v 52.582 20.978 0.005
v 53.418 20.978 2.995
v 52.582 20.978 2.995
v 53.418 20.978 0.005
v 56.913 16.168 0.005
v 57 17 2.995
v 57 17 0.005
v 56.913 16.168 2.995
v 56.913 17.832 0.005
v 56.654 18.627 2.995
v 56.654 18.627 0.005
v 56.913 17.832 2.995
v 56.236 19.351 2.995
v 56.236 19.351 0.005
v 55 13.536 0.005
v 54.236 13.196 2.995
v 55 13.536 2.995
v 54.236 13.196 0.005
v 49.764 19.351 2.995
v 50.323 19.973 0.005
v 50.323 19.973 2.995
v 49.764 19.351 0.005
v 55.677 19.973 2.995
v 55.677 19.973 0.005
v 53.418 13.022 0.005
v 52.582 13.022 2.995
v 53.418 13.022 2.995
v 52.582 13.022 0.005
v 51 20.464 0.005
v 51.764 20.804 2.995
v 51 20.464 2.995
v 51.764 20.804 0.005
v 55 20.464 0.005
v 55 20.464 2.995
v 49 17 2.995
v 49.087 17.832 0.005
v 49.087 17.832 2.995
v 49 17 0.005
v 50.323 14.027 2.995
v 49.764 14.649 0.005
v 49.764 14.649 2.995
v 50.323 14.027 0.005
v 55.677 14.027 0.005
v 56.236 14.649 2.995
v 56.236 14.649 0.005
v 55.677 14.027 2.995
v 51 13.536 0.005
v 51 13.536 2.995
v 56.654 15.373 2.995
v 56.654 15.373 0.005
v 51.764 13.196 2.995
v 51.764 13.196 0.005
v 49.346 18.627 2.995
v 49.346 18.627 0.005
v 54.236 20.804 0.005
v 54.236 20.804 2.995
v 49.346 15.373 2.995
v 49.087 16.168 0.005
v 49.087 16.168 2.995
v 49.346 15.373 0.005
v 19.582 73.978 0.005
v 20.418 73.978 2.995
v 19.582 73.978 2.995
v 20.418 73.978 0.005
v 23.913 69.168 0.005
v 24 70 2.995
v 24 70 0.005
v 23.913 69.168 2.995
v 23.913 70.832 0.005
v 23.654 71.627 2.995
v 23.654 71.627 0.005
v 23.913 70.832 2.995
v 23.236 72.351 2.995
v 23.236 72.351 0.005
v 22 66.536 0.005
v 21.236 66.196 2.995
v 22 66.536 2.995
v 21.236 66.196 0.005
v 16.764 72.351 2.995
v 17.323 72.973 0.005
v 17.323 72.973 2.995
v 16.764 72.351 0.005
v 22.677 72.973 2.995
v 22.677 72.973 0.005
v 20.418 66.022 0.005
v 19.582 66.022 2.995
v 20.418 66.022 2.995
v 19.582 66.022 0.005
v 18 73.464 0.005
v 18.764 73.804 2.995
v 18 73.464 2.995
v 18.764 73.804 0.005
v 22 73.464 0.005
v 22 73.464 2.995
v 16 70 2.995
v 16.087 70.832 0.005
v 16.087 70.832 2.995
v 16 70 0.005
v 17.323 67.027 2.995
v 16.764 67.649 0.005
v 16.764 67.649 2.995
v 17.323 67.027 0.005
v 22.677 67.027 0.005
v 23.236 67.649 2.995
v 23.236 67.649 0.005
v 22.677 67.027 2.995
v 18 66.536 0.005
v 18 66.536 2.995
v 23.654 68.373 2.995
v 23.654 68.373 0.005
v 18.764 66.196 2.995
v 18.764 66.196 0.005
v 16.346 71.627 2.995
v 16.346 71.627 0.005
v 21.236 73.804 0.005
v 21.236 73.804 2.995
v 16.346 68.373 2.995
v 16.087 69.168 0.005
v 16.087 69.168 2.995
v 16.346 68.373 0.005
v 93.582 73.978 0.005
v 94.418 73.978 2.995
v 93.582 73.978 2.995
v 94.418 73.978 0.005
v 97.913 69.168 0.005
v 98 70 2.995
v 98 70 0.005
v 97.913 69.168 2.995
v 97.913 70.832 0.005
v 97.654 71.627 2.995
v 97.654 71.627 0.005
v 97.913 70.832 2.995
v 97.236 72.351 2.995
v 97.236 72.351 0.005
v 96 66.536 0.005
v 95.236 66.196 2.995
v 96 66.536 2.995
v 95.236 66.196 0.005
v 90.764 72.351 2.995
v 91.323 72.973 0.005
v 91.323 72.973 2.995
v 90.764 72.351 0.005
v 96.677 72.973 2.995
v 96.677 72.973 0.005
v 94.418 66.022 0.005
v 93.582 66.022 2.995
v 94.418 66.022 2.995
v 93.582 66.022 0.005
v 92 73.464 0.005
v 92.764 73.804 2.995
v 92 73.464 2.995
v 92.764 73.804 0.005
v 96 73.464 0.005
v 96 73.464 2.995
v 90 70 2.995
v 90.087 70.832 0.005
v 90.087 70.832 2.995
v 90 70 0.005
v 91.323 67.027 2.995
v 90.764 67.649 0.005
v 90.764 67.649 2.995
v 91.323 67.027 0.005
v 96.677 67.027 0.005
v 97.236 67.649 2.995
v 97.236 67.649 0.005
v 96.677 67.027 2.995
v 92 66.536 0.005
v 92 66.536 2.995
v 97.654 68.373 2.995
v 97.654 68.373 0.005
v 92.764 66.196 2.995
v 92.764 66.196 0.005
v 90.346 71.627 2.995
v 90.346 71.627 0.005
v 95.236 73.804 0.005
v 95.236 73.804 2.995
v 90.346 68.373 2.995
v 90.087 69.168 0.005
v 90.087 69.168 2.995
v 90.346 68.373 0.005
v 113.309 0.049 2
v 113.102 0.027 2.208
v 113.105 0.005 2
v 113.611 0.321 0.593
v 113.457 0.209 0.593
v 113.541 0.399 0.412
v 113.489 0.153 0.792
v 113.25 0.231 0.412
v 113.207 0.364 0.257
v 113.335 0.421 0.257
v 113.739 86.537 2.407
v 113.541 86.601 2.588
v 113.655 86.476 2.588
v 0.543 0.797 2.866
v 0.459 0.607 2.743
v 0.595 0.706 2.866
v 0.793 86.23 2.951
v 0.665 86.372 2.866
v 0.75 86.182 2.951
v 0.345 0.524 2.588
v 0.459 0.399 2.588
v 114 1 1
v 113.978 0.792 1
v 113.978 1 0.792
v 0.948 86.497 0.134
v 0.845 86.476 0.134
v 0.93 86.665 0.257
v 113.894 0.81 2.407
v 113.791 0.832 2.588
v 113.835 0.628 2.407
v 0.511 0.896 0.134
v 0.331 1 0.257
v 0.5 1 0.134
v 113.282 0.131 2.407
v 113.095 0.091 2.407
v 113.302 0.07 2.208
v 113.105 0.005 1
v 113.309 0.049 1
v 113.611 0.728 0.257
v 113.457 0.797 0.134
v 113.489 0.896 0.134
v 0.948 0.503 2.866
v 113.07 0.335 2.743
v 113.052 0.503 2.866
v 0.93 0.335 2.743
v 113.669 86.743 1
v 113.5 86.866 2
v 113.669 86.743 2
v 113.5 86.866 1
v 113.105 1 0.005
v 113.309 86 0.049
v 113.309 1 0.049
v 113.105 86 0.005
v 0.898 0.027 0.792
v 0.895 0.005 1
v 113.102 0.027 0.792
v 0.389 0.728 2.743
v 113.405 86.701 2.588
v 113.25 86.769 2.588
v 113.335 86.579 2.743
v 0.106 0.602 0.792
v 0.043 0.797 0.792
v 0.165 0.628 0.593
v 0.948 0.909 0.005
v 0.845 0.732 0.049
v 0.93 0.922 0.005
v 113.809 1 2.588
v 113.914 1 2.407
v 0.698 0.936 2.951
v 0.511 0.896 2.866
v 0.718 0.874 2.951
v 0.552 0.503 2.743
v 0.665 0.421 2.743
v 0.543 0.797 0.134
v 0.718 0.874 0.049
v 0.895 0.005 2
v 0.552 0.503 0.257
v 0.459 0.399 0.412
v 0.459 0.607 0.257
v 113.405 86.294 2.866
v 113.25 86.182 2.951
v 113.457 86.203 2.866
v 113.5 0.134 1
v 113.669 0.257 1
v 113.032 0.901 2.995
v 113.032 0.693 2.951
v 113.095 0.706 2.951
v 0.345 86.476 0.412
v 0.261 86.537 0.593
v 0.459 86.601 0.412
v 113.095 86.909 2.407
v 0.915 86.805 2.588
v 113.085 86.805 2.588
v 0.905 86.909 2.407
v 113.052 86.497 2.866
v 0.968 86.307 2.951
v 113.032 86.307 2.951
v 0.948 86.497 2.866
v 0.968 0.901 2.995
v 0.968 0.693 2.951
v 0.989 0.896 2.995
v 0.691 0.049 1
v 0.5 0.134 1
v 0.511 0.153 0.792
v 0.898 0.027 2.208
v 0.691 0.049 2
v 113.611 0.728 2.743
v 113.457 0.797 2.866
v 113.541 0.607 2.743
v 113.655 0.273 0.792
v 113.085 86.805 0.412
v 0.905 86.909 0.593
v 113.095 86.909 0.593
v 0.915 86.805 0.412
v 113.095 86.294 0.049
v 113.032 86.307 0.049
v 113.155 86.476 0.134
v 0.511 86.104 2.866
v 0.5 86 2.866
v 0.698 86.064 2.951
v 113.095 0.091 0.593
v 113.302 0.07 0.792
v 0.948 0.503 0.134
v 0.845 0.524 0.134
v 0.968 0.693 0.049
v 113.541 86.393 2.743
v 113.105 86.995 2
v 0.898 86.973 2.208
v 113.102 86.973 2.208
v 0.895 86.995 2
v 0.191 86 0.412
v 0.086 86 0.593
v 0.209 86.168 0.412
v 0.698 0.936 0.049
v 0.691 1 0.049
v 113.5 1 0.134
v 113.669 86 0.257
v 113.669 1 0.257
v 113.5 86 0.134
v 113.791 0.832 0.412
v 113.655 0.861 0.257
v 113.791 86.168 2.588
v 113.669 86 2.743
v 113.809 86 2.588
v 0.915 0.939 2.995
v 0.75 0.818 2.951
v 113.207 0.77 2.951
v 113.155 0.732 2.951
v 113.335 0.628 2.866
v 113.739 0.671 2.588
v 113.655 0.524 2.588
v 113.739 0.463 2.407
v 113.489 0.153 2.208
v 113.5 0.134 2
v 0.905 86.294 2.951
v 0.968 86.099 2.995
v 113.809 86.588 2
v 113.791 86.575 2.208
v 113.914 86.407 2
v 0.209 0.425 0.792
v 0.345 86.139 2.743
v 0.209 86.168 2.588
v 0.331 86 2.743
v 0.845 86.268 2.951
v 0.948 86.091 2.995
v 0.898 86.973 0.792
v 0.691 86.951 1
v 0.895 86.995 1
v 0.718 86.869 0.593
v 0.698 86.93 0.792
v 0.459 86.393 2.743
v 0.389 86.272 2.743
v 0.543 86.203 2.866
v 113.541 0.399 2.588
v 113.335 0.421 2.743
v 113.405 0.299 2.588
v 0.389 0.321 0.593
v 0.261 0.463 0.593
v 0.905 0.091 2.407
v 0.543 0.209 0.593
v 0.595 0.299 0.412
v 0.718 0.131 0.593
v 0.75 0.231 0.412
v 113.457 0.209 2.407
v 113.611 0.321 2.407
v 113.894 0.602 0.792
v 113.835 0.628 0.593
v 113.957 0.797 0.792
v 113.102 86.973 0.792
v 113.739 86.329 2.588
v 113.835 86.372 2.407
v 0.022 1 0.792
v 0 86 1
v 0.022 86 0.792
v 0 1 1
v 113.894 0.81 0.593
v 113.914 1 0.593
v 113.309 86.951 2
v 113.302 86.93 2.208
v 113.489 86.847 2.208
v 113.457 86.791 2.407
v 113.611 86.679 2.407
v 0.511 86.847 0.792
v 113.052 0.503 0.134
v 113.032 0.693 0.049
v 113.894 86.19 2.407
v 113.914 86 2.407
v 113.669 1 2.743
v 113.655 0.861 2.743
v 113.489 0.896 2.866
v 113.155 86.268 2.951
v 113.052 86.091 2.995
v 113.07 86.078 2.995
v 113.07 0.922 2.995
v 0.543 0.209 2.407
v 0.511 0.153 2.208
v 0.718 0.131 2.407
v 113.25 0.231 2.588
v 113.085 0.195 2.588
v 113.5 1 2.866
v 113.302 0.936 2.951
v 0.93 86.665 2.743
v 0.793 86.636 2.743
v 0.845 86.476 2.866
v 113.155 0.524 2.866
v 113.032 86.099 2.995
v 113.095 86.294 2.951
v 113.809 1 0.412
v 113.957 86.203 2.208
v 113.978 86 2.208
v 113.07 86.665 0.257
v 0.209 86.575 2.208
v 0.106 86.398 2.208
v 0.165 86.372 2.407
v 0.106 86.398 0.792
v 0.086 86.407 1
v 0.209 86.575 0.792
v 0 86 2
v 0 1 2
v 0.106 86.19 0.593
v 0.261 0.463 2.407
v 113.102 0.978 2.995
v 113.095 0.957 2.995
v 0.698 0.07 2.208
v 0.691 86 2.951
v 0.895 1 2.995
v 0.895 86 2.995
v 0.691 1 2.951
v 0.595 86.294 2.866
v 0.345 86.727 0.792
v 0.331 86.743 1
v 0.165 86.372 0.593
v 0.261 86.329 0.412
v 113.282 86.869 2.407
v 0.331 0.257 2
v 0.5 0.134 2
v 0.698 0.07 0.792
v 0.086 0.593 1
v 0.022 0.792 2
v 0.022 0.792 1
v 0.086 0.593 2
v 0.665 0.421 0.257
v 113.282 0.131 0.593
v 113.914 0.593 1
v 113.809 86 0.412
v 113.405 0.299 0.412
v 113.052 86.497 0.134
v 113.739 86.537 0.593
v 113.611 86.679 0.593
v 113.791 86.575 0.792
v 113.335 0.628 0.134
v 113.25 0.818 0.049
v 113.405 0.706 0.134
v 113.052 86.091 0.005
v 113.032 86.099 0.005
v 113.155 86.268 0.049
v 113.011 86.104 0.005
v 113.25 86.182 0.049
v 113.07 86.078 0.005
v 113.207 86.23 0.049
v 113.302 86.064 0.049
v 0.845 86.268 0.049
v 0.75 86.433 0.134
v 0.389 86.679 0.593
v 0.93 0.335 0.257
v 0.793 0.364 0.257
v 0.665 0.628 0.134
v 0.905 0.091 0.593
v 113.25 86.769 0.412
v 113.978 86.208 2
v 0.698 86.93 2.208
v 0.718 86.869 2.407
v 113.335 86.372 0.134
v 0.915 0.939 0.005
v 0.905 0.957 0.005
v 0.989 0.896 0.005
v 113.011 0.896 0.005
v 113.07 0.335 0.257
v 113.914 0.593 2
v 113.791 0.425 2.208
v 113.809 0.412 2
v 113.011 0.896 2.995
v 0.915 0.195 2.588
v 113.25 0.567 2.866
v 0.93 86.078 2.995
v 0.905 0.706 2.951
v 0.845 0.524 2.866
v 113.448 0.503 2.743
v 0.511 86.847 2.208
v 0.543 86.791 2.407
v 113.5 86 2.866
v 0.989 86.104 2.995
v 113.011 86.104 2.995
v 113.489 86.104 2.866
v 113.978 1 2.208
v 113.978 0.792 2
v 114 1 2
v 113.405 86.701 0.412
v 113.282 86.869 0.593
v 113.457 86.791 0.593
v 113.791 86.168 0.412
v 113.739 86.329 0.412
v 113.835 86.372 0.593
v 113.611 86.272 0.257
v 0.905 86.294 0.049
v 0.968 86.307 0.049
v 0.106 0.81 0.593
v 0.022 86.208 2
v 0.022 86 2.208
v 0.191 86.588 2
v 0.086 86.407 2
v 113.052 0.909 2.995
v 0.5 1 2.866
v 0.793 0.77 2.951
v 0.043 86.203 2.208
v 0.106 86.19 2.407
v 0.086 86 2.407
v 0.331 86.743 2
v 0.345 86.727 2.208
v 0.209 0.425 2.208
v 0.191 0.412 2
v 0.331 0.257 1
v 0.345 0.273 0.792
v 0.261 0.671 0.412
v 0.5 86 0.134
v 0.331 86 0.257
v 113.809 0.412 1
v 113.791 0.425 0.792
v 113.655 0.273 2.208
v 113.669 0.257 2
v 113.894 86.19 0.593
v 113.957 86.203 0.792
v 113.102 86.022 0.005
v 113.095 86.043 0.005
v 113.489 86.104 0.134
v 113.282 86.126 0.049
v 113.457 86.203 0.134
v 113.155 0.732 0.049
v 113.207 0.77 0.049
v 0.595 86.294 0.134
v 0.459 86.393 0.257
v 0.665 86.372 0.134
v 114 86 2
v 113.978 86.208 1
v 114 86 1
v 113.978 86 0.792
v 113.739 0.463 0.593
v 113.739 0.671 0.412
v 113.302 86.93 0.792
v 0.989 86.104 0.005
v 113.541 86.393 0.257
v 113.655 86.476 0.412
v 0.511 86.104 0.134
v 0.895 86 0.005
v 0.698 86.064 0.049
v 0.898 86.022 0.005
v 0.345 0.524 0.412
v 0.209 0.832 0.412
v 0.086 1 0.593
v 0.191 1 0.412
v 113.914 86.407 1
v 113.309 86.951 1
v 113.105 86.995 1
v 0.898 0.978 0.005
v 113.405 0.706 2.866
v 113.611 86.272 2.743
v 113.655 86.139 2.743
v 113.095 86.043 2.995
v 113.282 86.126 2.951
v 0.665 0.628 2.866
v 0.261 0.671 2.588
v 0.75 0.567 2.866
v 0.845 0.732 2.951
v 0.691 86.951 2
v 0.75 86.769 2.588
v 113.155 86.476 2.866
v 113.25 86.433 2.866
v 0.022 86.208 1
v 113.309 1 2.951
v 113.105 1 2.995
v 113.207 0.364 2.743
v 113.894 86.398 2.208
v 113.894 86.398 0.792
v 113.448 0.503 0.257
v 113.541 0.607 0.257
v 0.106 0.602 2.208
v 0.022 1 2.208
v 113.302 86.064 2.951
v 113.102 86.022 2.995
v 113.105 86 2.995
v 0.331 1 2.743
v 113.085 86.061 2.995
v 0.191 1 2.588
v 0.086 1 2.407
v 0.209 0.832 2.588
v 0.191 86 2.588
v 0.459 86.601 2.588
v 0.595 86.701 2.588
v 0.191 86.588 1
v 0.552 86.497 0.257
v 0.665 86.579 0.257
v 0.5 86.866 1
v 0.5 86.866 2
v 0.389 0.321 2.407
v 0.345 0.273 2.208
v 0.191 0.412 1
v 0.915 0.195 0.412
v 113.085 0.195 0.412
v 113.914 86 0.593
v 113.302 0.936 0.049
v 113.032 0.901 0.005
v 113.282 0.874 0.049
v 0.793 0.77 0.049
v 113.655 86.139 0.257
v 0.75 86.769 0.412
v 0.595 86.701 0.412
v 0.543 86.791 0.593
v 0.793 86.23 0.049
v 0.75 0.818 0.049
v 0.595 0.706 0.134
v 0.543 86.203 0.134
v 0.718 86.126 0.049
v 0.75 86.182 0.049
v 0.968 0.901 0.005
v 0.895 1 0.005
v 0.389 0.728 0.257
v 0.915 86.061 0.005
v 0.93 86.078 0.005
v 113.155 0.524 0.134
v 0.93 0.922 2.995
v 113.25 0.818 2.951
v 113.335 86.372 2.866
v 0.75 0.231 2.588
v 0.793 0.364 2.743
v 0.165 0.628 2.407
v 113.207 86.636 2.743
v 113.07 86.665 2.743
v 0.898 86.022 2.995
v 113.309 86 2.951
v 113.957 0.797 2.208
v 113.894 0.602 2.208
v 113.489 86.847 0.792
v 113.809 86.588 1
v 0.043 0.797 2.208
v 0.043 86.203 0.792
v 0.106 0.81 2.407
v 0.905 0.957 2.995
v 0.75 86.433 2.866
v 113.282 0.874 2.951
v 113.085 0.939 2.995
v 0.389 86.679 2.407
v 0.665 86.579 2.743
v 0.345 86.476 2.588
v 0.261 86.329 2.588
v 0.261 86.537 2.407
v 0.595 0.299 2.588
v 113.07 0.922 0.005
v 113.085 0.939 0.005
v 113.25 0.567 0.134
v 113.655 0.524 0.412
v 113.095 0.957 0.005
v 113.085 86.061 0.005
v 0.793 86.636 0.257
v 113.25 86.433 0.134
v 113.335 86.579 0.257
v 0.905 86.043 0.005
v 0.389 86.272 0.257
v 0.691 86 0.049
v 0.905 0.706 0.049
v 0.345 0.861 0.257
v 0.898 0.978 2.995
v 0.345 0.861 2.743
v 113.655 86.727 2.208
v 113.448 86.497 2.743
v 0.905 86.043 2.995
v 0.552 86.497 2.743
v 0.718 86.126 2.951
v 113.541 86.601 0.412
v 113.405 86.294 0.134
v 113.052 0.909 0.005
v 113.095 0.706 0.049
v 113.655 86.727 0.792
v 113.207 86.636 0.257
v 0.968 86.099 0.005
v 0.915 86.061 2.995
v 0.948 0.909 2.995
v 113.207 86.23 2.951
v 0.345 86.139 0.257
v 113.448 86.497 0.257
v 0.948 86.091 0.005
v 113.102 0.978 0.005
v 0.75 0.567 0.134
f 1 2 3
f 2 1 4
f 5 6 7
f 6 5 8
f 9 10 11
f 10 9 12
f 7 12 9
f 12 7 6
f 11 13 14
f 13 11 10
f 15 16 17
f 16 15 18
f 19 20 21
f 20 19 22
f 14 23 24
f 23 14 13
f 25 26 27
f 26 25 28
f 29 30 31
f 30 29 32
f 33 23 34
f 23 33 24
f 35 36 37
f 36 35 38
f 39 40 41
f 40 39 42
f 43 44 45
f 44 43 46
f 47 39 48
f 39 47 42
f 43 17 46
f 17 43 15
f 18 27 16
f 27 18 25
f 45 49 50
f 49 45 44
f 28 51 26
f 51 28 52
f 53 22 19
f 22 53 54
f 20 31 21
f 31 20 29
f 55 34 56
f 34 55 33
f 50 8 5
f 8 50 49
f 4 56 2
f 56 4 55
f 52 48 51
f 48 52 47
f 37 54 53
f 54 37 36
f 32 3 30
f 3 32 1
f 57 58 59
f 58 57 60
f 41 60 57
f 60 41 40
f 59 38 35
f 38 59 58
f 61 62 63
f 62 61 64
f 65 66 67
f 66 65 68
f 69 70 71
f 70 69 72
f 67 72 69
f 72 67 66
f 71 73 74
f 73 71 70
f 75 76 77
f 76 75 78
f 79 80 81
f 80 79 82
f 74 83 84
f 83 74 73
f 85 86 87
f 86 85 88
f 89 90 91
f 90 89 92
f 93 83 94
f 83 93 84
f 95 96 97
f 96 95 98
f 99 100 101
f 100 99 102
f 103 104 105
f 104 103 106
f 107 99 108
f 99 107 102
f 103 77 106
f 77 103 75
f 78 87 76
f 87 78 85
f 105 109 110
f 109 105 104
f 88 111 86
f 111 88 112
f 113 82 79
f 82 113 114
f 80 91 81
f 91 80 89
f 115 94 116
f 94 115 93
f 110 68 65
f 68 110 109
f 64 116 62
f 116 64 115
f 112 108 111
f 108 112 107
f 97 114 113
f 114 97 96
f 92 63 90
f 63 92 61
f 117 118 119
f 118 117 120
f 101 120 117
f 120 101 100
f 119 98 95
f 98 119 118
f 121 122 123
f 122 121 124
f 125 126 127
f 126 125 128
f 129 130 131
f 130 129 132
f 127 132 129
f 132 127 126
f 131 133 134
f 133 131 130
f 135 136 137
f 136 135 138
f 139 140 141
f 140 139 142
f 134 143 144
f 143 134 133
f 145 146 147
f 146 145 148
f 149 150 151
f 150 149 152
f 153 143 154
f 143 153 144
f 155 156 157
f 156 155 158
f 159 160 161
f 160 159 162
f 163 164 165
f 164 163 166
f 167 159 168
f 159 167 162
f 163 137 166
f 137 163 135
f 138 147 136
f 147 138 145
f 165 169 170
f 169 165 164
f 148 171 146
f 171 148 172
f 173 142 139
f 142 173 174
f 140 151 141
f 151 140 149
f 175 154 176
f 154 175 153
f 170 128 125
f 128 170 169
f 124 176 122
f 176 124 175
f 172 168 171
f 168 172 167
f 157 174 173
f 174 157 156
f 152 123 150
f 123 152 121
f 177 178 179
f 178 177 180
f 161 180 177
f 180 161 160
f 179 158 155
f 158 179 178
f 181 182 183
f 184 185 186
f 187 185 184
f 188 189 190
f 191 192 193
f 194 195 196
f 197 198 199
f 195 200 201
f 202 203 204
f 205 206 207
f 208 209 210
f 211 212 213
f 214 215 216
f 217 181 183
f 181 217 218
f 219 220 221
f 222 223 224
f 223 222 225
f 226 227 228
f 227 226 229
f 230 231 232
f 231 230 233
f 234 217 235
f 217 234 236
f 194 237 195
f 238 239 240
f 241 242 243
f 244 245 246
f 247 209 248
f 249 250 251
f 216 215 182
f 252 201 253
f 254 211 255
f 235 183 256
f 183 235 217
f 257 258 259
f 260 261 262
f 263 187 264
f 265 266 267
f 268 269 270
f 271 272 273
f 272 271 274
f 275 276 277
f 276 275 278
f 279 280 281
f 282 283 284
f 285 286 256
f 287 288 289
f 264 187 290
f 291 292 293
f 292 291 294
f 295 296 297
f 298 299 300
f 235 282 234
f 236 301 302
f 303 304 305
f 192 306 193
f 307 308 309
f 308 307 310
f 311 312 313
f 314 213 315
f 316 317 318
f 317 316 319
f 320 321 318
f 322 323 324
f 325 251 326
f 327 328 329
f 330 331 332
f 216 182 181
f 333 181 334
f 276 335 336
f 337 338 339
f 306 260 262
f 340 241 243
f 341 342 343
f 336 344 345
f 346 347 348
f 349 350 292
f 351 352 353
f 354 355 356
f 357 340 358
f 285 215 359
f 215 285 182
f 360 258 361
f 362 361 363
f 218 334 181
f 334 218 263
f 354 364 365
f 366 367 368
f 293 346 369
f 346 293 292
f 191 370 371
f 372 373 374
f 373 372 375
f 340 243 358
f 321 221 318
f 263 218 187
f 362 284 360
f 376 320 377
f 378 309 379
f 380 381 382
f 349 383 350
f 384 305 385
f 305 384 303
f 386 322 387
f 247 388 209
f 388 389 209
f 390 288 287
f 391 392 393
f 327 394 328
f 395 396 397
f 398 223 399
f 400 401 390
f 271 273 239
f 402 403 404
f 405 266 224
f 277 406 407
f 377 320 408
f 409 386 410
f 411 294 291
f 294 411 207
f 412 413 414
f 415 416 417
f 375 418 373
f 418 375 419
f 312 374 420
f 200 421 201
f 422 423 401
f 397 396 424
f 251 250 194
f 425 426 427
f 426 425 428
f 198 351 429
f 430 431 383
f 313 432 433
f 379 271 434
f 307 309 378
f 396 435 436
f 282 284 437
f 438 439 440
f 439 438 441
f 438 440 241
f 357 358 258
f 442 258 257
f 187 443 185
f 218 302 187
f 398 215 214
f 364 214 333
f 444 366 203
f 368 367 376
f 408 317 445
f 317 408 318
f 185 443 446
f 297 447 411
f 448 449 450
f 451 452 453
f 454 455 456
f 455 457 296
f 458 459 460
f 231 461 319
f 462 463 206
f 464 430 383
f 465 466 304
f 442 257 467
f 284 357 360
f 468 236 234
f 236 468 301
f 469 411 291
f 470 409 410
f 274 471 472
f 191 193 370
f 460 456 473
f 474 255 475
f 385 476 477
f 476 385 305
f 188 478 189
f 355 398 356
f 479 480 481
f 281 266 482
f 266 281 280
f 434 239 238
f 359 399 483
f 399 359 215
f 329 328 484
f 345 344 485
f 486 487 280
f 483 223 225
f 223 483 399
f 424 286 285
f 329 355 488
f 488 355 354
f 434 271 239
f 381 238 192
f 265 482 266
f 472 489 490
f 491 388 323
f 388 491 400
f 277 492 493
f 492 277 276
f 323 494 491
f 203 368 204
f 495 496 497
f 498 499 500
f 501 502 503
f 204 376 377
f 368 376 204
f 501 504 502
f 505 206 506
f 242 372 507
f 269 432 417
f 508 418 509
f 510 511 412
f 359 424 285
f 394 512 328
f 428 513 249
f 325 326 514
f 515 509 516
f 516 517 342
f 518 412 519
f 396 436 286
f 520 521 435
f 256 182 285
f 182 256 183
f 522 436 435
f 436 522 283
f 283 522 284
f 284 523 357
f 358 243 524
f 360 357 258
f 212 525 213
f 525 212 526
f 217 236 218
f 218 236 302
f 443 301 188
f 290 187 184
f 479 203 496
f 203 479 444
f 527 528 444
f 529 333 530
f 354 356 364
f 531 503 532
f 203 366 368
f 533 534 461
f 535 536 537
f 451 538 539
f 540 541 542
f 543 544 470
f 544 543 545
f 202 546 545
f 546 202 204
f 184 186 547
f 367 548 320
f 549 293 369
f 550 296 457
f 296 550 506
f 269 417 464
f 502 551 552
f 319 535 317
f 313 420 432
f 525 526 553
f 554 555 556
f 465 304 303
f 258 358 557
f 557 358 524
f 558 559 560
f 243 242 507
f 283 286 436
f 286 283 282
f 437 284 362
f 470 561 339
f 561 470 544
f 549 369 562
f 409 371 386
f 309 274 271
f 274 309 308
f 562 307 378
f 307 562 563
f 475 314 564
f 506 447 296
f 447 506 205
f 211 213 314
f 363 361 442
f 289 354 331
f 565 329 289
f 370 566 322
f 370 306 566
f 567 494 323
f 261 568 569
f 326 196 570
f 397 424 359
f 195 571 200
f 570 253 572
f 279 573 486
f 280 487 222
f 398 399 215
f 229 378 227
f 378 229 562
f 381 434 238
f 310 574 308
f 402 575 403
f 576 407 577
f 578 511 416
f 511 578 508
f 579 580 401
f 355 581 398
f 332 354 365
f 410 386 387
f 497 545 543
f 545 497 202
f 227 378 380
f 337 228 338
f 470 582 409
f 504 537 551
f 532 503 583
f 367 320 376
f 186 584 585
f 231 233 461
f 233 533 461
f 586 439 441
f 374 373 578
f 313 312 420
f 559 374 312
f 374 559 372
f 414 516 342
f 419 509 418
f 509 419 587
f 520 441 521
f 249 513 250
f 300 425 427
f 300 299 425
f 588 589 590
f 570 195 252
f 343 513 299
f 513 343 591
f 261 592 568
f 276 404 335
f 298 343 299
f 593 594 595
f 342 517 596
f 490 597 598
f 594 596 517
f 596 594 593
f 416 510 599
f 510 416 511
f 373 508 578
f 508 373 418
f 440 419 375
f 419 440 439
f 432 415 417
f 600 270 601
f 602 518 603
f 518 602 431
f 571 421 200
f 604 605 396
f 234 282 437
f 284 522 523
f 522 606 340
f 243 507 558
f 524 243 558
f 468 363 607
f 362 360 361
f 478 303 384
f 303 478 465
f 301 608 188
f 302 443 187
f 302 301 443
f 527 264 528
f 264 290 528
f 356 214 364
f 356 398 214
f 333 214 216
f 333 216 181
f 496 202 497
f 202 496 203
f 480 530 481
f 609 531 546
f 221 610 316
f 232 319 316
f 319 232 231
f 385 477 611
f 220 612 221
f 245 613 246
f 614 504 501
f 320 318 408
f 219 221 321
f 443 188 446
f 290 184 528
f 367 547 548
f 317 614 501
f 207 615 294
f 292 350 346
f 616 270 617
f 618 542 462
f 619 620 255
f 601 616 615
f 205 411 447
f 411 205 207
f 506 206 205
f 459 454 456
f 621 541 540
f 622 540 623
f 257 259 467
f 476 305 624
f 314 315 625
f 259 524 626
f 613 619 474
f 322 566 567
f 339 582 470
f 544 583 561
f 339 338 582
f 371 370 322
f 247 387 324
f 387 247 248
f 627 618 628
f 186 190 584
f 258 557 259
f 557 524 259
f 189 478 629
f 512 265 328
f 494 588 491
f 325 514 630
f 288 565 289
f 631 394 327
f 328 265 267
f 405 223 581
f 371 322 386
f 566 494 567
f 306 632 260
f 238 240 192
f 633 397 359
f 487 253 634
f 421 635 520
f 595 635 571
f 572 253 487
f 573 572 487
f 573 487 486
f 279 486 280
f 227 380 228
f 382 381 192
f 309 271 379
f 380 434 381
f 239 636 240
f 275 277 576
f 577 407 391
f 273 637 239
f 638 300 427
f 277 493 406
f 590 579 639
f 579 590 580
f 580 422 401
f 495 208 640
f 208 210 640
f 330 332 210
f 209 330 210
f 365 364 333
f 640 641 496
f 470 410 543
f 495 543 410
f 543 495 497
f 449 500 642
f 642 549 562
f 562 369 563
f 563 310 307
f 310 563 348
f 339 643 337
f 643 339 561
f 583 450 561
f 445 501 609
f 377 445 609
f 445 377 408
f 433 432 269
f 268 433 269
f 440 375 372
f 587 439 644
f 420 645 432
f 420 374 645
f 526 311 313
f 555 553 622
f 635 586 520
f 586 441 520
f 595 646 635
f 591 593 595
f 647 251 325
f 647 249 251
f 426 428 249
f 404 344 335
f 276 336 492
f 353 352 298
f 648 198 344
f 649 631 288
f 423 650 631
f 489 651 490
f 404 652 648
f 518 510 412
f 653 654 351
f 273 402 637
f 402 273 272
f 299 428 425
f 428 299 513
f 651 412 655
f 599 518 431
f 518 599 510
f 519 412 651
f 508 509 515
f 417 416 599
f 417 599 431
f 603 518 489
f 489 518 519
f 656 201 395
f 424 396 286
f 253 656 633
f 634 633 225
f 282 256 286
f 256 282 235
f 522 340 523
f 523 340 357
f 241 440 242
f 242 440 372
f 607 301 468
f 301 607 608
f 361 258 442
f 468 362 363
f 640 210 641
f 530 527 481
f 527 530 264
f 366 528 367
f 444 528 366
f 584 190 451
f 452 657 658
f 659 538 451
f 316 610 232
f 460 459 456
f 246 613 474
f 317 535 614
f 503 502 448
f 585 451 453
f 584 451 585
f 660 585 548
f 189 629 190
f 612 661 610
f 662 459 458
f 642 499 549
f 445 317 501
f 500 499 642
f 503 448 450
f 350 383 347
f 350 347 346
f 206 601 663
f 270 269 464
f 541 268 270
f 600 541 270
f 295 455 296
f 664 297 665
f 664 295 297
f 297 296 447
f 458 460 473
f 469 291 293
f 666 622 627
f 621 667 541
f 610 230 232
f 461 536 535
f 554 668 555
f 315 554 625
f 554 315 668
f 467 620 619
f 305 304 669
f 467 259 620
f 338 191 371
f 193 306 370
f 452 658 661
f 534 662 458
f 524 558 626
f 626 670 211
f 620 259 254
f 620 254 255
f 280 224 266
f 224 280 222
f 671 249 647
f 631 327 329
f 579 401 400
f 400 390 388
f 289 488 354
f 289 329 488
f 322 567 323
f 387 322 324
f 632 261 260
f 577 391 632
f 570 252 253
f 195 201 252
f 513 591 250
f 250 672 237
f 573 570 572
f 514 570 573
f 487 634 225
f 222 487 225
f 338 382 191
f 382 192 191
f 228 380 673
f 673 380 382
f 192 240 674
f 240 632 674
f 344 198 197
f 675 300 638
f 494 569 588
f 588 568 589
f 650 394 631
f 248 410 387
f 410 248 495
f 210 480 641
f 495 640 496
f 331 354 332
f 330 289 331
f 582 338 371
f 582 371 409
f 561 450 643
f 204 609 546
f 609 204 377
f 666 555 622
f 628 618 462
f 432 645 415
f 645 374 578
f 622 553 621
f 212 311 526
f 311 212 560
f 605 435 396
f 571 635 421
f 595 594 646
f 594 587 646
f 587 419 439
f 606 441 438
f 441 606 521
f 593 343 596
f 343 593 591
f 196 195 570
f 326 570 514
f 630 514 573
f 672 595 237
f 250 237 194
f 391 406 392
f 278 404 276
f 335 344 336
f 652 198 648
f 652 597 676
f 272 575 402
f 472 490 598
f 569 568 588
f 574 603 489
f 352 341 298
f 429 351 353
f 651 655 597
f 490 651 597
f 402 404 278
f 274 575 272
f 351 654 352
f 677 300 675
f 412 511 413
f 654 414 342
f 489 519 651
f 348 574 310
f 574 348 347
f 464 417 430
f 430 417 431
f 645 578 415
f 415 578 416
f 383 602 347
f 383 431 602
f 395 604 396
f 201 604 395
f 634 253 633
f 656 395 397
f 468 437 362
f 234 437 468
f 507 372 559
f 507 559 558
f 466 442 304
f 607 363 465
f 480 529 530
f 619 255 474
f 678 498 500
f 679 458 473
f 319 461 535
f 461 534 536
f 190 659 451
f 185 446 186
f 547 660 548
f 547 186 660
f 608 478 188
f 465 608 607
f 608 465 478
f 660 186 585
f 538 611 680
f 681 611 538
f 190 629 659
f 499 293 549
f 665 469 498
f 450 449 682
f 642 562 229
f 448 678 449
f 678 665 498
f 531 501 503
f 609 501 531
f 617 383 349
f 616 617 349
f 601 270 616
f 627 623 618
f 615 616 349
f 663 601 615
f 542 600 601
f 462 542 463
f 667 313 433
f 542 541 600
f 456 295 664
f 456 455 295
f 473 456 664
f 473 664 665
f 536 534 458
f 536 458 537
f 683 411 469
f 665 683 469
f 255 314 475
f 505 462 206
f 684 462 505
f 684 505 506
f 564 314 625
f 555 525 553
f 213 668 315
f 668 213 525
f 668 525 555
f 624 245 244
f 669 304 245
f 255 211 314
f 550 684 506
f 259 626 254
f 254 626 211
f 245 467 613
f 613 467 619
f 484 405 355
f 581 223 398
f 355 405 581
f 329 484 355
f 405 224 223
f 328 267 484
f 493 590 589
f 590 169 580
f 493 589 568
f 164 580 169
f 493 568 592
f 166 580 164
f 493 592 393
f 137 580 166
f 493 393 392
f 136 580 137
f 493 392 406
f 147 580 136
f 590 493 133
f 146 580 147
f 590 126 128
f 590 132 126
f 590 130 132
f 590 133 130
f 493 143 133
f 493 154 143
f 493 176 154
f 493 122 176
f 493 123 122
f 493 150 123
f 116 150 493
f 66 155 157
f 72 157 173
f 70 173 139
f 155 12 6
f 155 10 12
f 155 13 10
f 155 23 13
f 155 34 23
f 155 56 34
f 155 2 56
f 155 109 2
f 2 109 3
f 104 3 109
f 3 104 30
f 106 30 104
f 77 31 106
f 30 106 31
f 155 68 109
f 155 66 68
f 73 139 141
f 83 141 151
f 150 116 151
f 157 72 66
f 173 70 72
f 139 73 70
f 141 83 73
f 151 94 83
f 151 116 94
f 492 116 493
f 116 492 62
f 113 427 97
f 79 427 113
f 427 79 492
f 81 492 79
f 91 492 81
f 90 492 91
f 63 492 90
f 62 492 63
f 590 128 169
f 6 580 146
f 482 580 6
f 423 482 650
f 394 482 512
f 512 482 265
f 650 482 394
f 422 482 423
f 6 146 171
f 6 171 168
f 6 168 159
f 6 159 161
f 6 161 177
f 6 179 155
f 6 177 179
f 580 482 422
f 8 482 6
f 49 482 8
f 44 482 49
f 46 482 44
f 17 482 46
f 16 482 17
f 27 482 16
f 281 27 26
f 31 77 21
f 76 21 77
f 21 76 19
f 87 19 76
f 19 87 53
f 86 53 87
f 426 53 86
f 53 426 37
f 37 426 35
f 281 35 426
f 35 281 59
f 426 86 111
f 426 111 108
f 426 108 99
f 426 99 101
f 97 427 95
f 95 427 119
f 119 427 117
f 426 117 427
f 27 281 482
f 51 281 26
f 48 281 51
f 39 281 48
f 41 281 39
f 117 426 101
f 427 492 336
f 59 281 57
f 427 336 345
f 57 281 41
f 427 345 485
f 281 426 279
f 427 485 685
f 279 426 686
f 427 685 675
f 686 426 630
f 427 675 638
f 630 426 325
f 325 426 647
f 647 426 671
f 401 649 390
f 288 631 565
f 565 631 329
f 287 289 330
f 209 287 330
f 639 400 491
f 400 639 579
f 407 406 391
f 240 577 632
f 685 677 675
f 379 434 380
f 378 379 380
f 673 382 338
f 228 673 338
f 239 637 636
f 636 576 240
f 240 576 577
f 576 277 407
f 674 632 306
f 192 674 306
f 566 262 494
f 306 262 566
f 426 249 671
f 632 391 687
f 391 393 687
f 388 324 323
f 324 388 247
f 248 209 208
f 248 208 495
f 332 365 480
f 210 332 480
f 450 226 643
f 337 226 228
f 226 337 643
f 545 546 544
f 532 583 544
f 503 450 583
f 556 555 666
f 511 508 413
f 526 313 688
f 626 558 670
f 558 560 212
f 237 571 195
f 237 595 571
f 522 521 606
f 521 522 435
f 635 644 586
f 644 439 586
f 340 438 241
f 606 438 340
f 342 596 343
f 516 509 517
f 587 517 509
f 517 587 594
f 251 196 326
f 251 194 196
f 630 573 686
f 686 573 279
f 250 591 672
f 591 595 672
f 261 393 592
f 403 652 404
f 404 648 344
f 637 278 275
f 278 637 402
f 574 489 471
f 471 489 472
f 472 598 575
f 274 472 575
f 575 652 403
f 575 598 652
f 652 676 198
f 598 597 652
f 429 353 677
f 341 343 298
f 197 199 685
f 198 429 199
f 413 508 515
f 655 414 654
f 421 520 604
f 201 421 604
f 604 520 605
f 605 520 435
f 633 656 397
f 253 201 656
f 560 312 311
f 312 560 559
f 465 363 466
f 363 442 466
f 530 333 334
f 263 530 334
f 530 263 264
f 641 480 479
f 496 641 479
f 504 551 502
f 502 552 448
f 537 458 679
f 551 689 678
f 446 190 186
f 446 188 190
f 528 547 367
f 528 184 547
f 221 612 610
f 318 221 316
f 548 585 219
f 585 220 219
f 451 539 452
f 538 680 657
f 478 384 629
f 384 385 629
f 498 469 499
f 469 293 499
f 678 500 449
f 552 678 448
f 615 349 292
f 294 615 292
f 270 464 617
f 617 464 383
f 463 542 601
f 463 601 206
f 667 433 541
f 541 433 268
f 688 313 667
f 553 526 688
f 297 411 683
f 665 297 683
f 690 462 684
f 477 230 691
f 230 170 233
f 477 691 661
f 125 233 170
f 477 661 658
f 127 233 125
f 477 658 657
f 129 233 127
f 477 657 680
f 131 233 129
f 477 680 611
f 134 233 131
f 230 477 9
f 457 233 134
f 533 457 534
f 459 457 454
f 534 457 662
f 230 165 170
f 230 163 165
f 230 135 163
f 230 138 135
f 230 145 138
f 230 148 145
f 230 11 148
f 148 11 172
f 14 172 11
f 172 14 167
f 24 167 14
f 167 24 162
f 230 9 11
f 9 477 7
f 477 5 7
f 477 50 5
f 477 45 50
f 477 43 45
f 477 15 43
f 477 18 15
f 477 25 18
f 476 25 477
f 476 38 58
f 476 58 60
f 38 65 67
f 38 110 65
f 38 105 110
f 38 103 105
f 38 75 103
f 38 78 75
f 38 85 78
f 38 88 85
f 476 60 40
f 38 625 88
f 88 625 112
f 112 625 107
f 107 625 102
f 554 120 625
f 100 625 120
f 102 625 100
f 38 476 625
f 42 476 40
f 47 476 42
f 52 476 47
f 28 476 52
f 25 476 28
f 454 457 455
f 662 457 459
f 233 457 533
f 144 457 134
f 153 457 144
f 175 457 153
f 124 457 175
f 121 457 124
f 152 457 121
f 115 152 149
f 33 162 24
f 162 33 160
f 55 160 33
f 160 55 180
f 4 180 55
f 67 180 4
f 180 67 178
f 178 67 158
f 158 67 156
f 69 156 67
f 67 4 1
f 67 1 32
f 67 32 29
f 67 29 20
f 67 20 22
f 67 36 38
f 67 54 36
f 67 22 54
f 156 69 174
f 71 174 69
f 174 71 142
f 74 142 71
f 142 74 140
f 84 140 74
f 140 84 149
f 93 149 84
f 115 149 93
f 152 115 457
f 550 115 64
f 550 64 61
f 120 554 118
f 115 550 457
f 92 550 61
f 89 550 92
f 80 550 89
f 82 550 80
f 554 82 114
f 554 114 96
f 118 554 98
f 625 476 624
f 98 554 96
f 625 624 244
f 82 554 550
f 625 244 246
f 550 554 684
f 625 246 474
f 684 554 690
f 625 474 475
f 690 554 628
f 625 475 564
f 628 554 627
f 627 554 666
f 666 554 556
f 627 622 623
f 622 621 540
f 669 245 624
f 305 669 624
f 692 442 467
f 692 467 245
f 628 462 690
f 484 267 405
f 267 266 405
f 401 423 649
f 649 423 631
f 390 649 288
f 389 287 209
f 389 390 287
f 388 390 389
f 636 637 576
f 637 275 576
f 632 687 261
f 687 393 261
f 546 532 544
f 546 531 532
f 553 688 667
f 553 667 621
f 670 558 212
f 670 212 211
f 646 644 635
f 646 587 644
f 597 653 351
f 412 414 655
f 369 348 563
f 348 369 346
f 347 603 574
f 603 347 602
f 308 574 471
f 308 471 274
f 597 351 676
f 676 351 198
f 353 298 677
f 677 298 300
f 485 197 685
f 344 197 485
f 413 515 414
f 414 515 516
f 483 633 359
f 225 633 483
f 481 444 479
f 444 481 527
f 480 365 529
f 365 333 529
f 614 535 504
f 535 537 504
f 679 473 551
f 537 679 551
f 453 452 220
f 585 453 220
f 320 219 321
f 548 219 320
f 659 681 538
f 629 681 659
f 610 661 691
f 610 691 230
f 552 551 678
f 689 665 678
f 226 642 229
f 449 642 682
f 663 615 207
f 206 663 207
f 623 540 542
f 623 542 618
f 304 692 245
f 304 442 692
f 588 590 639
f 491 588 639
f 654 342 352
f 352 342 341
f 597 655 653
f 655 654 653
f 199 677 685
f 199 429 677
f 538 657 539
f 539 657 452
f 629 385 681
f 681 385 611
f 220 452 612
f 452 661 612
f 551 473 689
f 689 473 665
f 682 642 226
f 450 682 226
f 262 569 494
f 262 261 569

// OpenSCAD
KBD_WIDTH = 69;
KBD_HEIGHT = 79;
KBD_THICK = 3;

SCR_WIDTH = 35;
SCR_HEIGHT = 42+6+5+10;
SCR_THICK = 8;

B_THICKNESS = 20;
B_WIDTH = 53;
B_HEIGHT = 72;

BORDER = 4;
SEP = 2;

BOX_WIDTH = KBD_WIDTH + SCR_WIDTH + (BORDER*2) + SEP;
BOX_HEIGHT = KBD_HEIGHT + (BORDER*2);
BOX_THICKNESS = B_THICKNESS + SCR_THICK + 3;

BOARD_X= ((KBD_WIDTH - B_WIDTH) /2) +BORDER;
BOARD_Y= ((KBD_HEIGHT - B_HEIGHT) /2) +BORDER;

CABLE_WIDTH = 21;

module boardVoid() {
    translate([
        BOARD_X,
        BOARD_Y,
        -1
    ])
    cube([B_WIDTH, B_HEIGHT, B_THICKNESS+2]);    
}


module kbdVoid() {
    translate([BORDER, BORDER, BOX_THICKNESS - KBD_THICK])
    cube([KBD_WIDTH, KBD_HEIGHT, KBD_THICK+2]);    
}

module scrVoid() {
    translate([
        BORDER + KBD_WIDTH + SEP,
                ((KBD_HEIGHT - SCR_HEIGHT) /2) +BORDER,

        BOX_THICKNESS - SCR_THICK])
    cube([SCR_WIDTH, SCR_HEIGHT, SCR_THICK+2]);    
}

module boardPegs() {
    s = B_THICKNESS /2;
    module p(x, y) {
        color("red")
        translate([BOARD_X+x,BOARD_Y+y,B_THICKNESS-s])
        cube([4, 4, s]); 
    }
 
    p(0, 0);
    p(0, B_HEIGHT-s);
    p(B_WIDTH-s, B_HEIGHT-s);
    p(B_WIDTH-s, 0);    
}



module mainBody() {
    difference() {
        union() {
            roundedcube([BOX_WIDTH, BOX_HEIGHT, BOX_THICKNESS], radius=BORDER);
        }
        union() {
            boardVoid();
            kbdVoid();
            scrVoid();
        }
    }
}

module bodyVoid() {
    color("red")
    translate([
        BORDER+(KBD_WIDTH/2)-(CABLE_WIDTH/2),
        BORDER*3,
        BOX_THICKNESS - KBD_THICK]) {
            cube([CABLE_WIDTH, KBD_HEIGHT, 5+2]);
            translate([0, 0, -BOX_THICKNESS+2])
            cube([CABLE_WIDTH, KBD_HEIGHT, 5+2]);
        }
        
x = BORDER + KBD_WIDTH + SEP;
y = +((KBD_HEIGHT + SCR_HEIGHT) /2) +BORDER;
z =    -BOX_THICKNESS/2 - SCR_THICK;
  
    color("cyan")
    translate([x, -15 +y, -z])
    rotate([-45, 0, 0])
    cube([SCR_WIDTH, SCR_HEIGHT/4, SCR_THICK+2]);    
    color("green")
    translate([x-15,  +y-65, +23 +z])
    cube([SCR_WIDTH+15, SCR_HEIGHT, SCR_THICK+10]);
   

   bb = BORDER*4;
        translate([-1, bb, 0])
  cube([CABLE_WIDTH, BOX_HEIGHT -bb*2, 20]);     
}

if (0)
difference() {
    union() {
        mainBody();
        //boardPegs();
    }
    union() {
        bodyVoid();
    }
}

difference() {
    roundedcube([BOX_WIDTH, BOX_HEIGHT, 3], radius=1);
    union() {
        translate([53, 17, 0])
        cylinder(r=4, h = 10);
        
        
        translate([20, BOX_HEIGHT-17, 0])
        cylinder(r=4, h = 10);
 
        translate([BOX_WIDTH-20, BOX_HEIGHT-17, 0])
        cylinder(r=4, h = 10);
        
        }
}

// Higher definition curves
$fs = 0.01;

module roundedcube(size = [1, 1, 1], center = false, radius = 0.5, apply_to = "all") {
	// If single value, convert to [x, y, z] vector
	size = (size[0] == undef) ? [size, size, size] : size;

	translate_min = radius;
	translate_xmax = size[0] - radius;
	translate_ymax = size[1] - radius;
	translate_zmax = size[2] - radius;

	diameter = radius * 2;

	module build_point(type = "sphere", rotate = [0, 0, 0]) {
		if (type == "sphere") {
			sphere(r = radius);
		} else if (type == "cylinder") {
			rotate(a = rotate)
			cylinder(h = diameter, r = radius, center = true);
		}
	}

	obj_translate = (center == false) ?
		[0, 0, 0] : [
			-(size[0] / 2),
			-(size[1] / 2),
			-(size[2] / 2)
		];

	translate(v = obj_translate) {
		hull() {
			for (translate_x = [translate_min, translate_xmax]) {
				x_at = (translate_x == translate_min) ? "min" : "max";
				for (translate_y = [translate_min, translate_ymax]) {
					y_at = (translate_y == translate_min) ? "min" : "max";
					for (translate_z = [translate_min, translate_zmax]) {
						z_at = (translate_z == translate_min) ? "min" : "max";

						translate(v = [translate_x, translate_y, translate_z])
						if (
							(apply_to == "all") ||
							(apply_to == "xmin" && x_at == "min") || (apply_to == "xmax" && x_at == "max") ||
							(apply_to == "ymin" && y_at == "min") || (apply_to == "ymax" && y_at == "max") ||
							(apply_to == "zmin" && z_at == "min") || (apply_to == "zmax" && z_at == "max")
						) {
							build_point("sphere");
						} else {
							rotate = 
								(apply_to == "xmin" || apply_to == "xmax" || apply_to == "x") ? [0, 90, 0] : (
								(apply_to == "ymin" || apply_to == "ymax" || apply_to == "y") ? [90, 90, 0] :
								[0, 0, 0]
							);
							build_point("cylinder", rotate);
						}
					}
				}
			}
		}
	}
}
